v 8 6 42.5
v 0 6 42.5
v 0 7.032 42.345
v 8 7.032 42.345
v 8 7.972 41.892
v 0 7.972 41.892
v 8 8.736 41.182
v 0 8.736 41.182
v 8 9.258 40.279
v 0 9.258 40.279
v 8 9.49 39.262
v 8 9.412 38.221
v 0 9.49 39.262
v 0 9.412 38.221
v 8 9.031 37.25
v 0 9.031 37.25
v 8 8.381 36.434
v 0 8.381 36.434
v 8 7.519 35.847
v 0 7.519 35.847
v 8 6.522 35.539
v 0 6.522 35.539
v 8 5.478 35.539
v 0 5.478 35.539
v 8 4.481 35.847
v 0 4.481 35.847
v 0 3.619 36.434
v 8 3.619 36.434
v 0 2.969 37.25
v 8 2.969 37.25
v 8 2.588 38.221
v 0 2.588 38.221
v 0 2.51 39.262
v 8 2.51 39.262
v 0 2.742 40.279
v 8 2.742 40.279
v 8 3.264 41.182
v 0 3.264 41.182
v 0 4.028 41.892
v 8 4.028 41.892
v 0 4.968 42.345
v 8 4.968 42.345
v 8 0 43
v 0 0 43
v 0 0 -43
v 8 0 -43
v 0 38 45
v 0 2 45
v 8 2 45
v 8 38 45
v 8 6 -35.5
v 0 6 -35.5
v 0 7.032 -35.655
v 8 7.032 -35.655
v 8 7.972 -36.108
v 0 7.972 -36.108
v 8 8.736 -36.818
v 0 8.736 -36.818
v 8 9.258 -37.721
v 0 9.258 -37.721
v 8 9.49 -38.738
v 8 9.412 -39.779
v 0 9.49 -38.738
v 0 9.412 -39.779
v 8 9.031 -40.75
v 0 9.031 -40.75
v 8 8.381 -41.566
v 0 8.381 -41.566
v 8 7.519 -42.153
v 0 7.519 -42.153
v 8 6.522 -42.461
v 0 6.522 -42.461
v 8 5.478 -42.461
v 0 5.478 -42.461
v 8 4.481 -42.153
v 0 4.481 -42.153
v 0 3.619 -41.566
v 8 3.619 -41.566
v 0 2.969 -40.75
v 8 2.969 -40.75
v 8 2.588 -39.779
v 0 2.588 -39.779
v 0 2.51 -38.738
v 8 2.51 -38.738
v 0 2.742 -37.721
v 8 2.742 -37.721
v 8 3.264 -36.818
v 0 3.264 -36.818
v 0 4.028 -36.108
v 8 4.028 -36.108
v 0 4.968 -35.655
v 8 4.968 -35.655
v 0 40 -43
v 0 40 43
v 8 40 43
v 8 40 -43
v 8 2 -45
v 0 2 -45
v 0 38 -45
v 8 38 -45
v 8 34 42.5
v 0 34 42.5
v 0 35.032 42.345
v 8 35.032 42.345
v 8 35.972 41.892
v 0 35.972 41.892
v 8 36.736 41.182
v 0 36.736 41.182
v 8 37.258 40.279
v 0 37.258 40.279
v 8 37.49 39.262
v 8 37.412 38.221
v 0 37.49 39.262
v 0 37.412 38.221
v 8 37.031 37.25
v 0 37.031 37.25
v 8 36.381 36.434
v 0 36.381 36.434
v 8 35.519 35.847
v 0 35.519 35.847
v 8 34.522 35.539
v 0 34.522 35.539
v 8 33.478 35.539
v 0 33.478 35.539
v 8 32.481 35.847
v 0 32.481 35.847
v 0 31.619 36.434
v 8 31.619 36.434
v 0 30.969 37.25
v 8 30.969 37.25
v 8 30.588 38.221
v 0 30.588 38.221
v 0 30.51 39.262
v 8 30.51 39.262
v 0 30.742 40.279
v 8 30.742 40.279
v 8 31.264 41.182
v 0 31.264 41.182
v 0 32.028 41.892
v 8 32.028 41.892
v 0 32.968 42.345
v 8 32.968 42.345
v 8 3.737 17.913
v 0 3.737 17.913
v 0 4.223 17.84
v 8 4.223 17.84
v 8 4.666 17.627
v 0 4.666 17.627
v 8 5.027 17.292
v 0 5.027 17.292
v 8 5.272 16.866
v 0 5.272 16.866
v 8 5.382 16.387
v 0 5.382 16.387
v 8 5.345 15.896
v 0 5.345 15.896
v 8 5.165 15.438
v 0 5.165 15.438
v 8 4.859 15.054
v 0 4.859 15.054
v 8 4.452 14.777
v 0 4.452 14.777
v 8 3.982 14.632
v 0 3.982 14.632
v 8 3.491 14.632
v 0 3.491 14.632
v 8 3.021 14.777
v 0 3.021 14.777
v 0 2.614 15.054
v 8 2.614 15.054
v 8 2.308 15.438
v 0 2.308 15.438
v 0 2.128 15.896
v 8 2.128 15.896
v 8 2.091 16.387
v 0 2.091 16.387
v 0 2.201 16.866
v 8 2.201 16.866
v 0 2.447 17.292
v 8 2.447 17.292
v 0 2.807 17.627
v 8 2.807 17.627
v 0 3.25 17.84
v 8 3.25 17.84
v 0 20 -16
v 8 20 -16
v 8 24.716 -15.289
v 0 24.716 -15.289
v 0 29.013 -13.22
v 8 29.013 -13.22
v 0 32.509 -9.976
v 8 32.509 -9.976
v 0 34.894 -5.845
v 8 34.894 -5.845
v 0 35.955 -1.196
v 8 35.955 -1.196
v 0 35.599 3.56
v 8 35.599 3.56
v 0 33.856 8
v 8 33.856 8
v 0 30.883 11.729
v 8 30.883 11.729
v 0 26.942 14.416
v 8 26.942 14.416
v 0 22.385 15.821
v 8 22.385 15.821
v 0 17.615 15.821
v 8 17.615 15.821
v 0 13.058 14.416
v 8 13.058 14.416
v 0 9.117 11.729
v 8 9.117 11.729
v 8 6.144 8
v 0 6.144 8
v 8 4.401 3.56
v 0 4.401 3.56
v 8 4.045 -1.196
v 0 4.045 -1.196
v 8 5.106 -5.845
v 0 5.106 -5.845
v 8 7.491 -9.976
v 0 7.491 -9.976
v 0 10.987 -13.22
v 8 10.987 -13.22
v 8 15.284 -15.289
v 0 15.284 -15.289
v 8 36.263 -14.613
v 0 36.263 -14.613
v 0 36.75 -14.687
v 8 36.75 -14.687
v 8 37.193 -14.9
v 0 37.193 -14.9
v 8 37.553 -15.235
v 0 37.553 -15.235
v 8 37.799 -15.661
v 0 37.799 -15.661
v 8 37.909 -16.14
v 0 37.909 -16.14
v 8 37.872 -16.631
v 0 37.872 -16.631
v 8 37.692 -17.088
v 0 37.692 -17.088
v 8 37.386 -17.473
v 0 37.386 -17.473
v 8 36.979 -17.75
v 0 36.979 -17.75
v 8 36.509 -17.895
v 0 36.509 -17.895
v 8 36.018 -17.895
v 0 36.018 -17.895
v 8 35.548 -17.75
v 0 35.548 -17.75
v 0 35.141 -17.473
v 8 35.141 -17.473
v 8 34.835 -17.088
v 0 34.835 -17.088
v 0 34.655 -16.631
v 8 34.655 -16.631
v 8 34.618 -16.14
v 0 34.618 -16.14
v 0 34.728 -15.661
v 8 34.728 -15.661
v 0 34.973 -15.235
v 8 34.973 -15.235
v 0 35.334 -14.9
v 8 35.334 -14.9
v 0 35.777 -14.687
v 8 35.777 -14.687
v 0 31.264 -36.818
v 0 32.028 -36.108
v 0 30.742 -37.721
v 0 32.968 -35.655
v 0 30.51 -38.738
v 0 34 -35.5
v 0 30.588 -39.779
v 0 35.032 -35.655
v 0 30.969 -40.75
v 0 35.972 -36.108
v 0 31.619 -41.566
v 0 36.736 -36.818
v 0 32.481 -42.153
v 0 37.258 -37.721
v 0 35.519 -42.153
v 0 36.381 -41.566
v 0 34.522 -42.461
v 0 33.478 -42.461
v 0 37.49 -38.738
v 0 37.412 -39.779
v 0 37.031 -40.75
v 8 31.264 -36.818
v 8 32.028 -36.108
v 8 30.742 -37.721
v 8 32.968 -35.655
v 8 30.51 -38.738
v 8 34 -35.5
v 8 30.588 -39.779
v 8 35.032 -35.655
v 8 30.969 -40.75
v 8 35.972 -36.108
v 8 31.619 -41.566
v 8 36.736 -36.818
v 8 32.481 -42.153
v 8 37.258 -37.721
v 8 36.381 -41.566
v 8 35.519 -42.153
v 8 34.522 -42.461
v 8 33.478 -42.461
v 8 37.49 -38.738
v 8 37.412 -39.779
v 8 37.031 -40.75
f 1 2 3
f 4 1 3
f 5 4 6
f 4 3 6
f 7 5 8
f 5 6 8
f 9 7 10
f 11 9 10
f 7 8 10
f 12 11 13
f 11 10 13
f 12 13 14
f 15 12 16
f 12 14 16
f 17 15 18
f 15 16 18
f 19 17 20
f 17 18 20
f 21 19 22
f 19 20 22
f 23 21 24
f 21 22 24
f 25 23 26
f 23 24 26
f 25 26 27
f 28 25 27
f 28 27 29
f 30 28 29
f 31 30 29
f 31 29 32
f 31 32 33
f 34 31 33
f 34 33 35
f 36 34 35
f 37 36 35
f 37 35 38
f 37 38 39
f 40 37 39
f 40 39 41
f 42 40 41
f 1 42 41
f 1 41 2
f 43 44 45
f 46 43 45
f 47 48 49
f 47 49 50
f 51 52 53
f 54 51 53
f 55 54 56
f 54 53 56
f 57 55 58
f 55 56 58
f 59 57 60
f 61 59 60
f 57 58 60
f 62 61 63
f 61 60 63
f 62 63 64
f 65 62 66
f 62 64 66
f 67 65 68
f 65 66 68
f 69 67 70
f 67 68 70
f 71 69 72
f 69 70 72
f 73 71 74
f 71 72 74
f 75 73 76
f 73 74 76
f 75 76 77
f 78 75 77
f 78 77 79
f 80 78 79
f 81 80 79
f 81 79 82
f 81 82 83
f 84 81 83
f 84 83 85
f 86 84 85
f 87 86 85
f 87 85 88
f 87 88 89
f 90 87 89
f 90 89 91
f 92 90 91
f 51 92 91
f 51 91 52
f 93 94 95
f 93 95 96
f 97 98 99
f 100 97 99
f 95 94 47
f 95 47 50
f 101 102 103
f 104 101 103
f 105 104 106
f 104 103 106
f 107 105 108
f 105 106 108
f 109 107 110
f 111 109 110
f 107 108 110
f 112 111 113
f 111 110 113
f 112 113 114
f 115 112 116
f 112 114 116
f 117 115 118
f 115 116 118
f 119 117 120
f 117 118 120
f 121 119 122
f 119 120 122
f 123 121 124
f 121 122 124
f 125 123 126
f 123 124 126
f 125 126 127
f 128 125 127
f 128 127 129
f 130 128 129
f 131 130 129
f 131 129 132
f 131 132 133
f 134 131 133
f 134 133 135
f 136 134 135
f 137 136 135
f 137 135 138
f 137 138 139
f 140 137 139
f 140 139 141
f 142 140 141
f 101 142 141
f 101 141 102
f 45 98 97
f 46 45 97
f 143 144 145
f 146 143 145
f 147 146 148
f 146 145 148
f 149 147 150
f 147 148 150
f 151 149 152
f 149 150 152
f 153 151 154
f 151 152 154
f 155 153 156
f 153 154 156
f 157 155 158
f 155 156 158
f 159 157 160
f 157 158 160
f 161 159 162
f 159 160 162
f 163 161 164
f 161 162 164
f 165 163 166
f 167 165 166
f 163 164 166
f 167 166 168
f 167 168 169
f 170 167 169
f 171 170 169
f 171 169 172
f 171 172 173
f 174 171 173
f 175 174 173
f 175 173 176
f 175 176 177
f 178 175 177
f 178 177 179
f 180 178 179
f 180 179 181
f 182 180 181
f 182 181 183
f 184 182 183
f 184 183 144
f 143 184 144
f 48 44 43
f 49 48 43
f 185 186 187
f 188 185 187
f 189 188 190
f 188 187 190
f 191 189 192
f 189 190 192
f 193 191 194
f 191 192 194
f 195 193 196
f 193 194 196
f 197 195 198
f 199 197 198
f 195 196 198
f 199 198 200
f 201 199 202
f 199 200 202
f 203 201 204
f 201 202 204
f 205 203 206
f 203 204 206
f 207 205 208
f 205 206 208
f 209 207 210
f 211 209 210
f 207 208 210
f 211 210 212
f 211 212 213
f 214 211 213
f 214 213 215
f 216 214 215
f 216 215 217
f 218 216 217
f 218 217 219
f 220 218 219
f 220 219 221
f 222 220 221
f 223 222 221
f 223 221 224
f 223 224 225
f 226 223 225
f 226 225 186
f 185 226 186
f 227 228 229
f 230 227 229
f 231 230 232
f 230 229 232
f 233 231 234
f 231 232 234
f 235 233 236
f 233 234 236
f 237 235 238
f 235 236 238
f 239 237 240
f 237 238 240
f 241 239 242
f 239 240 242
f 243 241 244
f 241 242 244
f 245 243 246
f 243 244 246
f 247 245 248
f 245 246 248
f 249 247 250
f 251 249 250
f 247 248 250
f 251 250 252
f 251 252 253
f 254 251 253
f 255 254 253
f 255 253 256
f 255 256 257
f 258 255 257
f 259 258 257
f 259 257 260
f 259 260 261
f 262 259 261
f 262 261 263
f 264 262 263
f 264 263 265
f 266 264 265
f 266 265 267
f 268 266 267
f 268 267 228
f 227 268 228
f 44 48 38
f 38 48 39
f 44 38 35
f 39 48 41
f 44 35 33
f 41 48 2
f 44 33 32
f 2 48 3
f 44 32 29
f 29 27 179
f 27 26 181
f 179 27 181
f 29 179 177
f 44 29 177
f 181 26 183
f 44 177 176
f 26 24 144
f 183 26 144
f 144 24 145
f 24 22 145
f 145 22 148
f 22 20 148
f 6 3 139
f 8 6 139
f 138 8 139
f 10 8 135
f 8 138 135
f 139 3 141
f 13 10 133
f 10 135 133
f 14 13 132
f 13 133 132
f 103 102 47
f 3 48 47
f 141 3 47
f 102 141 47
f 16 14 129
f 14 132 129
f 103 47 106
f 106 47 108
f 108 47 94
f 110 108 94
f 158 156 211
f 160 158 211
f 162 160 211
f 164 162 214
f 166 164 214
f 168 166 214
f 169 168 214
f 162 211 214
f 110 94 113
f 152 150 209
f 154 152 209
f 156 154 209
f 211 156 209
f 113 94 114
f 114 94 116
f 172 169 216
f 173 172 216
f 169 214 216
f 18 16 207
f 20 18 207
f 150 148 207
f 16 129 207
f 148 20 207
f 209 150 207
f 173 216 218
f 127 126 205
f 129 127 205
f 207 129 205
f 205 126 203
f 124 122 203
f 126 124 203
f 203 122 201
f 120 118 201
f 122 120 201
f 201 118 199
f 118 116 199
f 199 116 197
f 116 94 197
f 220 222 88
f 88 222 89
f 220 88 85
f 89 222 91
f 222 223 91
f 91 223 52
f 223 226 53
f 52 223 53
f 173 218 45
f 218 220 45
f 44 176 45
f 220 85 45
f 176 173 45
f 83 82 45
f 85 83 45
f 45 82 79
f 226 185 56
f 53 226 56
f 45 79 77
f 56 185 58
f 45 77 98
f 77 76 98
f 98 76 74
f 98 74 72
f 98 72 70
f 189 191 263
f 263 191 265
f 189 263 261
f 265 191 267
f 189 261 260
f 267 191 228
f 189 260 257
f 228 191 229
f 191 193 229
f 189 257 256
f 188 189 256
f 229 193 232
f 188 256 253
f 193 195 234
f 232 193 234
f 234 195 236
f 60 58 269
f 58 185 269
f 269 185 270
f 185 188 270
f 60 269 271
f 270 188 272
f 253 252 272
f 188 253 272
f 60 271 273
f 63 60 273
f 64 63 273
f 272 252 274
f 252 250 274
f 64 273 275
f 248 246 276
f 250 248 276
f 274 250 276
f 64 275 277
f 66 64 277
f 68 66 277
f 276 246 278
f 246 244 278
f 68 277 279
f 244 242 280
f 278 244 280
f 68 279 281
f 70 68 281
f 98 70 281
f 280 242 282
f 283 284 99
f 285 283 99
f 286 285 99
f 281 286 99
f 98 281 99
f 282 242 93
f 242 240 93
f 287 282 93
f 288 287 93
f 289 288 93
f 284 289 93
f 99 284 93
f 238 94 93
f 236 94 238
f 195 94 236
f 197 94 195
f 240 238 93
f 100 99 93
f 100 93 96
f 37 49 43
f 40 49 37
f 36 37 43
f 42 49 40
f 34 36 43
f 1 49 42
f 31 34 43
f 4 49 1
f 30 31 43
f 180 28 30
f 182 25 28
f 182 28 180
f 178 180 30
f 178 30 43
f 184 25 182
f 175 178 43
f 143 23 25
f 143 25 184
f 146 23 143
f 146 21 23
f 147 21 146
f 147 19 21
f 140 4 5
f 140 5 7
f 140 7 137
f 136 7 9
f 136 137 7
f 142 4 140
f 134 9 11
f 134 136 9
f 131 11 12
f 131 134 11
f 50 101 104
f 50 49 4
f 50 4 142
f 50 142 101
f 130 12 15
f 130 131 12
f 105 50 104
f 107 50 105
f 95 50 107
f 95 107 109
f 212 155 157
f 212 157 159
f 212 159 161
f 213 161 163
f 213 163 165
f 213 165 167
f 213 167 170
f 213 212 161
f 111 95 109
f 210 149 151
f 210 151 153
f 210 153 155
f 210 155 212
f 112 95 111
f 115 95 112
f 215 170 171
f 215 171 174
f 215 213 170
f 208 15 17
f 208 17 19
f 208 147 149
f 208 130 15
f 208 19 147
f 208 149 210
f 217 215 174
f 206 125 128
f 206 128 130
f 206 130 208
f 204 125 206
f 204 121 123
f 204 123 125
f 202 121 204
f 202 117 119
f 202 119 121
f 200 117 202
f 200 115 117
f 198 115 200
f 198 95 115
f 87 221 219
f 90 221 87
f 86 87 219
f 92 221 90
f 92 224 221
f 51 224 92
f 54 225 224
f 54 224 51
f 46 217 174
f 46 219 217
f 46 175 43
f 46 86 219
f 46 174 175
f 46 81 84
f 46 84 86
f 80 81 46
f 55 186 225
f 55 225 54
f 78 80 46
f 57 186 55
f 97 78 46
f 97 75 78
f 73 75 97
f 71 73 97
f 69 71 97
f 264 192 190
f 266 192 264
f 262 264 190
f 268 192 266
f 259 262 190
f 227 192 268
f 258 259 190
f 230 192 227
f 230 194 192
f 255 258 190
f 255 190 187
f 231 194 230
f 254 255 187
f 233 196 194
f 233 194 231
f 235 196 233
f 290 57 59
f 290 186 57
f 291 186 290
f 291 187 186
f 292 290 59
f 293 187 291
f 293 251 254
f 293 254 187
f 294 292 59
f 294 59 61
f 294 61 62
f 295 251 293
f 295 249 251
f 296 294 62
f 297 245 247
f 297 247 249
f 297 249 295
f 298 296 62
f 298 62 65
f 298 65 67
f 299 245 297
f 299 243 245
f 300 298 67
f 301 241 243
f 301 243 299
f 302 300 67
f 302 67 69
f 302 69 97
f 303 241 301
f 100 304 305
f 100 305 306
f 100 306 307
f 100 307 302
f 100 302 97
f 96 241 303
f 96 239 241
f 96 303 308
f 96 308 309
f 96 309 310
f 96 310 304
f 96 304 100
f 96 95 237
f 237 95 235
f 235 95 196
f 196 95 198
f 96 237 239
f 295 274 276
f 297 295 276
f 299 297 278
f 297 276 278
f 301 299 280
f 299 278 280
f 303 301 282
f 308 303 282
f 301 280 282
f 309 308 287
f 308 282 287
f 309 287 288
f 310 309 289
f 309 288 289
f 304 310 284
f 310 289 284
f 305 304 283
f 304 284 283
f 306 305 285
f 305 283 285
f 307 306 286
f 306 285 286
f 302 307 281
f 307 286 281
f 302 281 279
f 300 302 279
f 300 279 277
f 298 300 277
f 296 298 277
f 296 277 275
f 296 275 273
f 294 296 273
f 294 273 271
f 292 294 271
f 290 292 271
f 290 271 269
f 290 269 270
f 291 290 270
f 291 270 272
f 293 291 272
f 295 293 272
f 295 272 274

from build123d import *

# Parameters (mm, degrees)
SKETCH1_W                    = 90
SKETCH1_H                    = 40
BOSS_EXTRUDE1_DEPTH          = 8
SKETCH2_R                    = 16
CUT_EXTRUDE1_DEPTH           = 61.737138556
F_7_0_7_DIAMETER_HOLE1_D     = 7
F_7_0_7_DIAMETER_HOLE1_DEPTH = 60
F_7_0_7_DIAMETER_HOLE1_TIP   = 2.103012167
M4X0_7_TAPPED_HOLE1_D        = 3.3
CHAMFER1_SIZE                = 2


with BuildPart() as part:
    # Sketch1 → Boss-Extrude1 (new body)
    with BuildSketch(Plane(origin=(0, 0, 0), x_dir=(0, 0, -1), z_dir=(1, 0, 0))):
        with Locations((0, 20)):
            Rectangle(SKETCH1_W, SKETCH1_H)
    extrude(amount=BOSS_EXTRUDE1_DEPTH)

    # Sketch2 → Cut-Extrude1 (cut, through all)
    with BuildSketch(Plane(origin=(8, 0, 0), x_dir=(0, 0, -1), z_dir=(1, 0, 0))):
        with Locations((0, 20)):
            Circle(SKETCH2_R)
    extrude(amount=-CUT_EXTRUDE1_DEPTH, mode=Mode.SUBTRACT)

    # Ø7.0 (7) Diameter Hole1
    with Locations(Plane(origin=(8, 0, 0), x_dir=(0, 0, -1), z_dir=(1, 0, 0))):
        with Locations((-39, 6), (39, 6), (39, 34), (-39, 34)):
            Hole(F_7_0_7_DIAMETER_HOLE1_D / 2, depth=F_7_0_7_DIAMETER_HOLE1_DEPTH)
            with Locations((0, 0, -(F_7_0_7_DIAMETER_HOLE1_DEPTH + F_7_0_7_DIAMETER_HOLE1_TIP / 2))):  # 118° drill point
                Cone(0, F_7_0_7_DIAMETER_HOLE1_D / 2, F_7_0_7_DIAMETER_HOLE1_TIP, mode=Mode.SUBTRACT)

    # M4x0.7 Tapped Hole1 (through all)
    with Locations(Plane(origin=(8, 0, 0), x_dir=(0, 0, -1), z_dir=(1, 0, 0))):
        with Locations((16.263455967, 36.263455967), (-16.263455967, 3.736544033)):
            Hole(M4X0_7_TAPPED_HOLE1_D / 2)

    # Chamfer1
    chamfer1_edges = [part.edges().sort_by_distance(p)[0] for p in [
        (4, 0, -45),
        (4, 0, 45),
        (4, 40, 45),
        (4, 40, -45),
    ]]
    chamfer(chamfer1_edges, length=CHAMFER1_SIZE)


solid = part.part
